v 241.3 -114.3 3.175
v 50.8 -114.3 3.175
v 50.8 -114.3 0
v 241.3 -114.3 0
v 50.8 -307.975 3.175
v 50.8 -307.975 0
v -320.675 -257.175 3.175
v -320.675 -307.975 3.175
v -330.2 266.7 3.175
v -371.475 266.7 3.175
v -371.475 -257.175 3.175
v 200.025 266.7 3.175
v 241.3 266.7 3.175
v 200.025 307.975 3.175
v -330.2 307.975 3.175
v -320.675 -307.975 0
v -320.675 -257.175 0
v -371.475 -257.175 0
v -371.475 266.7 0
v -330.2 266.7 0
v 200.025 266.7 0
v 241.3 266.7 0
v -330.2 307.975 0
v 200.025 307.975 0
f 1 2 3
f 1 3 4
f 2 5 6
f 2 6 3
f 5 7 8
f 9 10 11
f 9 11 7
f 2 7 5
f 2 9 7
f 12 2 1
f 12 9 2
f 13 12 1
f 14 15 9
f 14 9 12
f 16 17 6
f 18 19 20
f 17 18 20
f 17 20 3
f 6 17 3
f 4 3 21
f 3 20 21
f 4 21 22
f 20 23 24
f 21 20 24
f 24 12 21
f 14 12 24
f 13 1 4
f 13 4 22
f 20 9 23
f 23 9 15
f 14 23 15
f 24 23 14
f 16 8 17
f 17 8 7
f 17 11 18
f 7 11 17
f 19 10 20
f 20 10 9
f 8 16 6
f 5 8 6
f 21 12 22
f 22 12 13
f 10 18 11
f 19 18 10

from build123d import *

# Parameters (mm, degrees)
SKETCH1_W           = 742.95
SKETCH1_H           = 615.95
BOSS_EXTRUDE1_DEPTH = 3.175
SKETCH2_W           = 41.275
SKETCH2_H           = 41.275
SKETCH2_W_2         = 50.8
SKETCH2_H_2         = 50.8
SKETCH2_W_3         = 190.5
SKETCH2_H_3         = 193.675
CUT_EXTRUDE1_DEPTH  = 483.54777678
SKETCH3_W           = 130.175
SKETCH3_H           = 615.95
CUT_EXTRUDE2_DEPTH  = 483.54777678


with BuildPart() as part:
    # Sketch1 → Boss-Extrude1 (new body)
    with BuildSketch(Plane.XY):
        Rectangle(SKETCH1_W, SKETCH1_H)
    extrude(amount=BOSS_EXTRUDE1_DEPTH)

    # Sketch2 → Cut-Extrude1 (cut, through all)
    with BuildSketch(Plane.XY.offset(3.175)):
        with Locations((-350.8375, 287.3375)):
            Rectangle(SKETCH2_W, SKETCH2_H)
        with Locations((-346.075, -282.575)):
            Rectangle(SKETCH2_W_2, SKETCH2_H_2)
        with Locations((220.6625, 287.3375)):
            Rectangle(SKETCH2_W, SKETCH2_H)
        with Locations((146.05, -211.1375)):
            Rectangle(SKETCH2_W_3, SKETCH2_H_3)
    extrude(amount=-CUT_EXTRUDE1_DEPTH, mode=Mode.SUBTRACT)

    # Sketch3 → Cut-Extrude2 (cut, through all)
    with BuildSketch(Plane.XY.offset(3.175)):
        with Locations((306.3875, 0)):
            Rectangle(SKETCH3_W, SKETCH3_H)
    extrude(amount=-CUT_EXTRUDE2_DEPTH, mode=Mode.SUBTRACT)


solid = part.part
